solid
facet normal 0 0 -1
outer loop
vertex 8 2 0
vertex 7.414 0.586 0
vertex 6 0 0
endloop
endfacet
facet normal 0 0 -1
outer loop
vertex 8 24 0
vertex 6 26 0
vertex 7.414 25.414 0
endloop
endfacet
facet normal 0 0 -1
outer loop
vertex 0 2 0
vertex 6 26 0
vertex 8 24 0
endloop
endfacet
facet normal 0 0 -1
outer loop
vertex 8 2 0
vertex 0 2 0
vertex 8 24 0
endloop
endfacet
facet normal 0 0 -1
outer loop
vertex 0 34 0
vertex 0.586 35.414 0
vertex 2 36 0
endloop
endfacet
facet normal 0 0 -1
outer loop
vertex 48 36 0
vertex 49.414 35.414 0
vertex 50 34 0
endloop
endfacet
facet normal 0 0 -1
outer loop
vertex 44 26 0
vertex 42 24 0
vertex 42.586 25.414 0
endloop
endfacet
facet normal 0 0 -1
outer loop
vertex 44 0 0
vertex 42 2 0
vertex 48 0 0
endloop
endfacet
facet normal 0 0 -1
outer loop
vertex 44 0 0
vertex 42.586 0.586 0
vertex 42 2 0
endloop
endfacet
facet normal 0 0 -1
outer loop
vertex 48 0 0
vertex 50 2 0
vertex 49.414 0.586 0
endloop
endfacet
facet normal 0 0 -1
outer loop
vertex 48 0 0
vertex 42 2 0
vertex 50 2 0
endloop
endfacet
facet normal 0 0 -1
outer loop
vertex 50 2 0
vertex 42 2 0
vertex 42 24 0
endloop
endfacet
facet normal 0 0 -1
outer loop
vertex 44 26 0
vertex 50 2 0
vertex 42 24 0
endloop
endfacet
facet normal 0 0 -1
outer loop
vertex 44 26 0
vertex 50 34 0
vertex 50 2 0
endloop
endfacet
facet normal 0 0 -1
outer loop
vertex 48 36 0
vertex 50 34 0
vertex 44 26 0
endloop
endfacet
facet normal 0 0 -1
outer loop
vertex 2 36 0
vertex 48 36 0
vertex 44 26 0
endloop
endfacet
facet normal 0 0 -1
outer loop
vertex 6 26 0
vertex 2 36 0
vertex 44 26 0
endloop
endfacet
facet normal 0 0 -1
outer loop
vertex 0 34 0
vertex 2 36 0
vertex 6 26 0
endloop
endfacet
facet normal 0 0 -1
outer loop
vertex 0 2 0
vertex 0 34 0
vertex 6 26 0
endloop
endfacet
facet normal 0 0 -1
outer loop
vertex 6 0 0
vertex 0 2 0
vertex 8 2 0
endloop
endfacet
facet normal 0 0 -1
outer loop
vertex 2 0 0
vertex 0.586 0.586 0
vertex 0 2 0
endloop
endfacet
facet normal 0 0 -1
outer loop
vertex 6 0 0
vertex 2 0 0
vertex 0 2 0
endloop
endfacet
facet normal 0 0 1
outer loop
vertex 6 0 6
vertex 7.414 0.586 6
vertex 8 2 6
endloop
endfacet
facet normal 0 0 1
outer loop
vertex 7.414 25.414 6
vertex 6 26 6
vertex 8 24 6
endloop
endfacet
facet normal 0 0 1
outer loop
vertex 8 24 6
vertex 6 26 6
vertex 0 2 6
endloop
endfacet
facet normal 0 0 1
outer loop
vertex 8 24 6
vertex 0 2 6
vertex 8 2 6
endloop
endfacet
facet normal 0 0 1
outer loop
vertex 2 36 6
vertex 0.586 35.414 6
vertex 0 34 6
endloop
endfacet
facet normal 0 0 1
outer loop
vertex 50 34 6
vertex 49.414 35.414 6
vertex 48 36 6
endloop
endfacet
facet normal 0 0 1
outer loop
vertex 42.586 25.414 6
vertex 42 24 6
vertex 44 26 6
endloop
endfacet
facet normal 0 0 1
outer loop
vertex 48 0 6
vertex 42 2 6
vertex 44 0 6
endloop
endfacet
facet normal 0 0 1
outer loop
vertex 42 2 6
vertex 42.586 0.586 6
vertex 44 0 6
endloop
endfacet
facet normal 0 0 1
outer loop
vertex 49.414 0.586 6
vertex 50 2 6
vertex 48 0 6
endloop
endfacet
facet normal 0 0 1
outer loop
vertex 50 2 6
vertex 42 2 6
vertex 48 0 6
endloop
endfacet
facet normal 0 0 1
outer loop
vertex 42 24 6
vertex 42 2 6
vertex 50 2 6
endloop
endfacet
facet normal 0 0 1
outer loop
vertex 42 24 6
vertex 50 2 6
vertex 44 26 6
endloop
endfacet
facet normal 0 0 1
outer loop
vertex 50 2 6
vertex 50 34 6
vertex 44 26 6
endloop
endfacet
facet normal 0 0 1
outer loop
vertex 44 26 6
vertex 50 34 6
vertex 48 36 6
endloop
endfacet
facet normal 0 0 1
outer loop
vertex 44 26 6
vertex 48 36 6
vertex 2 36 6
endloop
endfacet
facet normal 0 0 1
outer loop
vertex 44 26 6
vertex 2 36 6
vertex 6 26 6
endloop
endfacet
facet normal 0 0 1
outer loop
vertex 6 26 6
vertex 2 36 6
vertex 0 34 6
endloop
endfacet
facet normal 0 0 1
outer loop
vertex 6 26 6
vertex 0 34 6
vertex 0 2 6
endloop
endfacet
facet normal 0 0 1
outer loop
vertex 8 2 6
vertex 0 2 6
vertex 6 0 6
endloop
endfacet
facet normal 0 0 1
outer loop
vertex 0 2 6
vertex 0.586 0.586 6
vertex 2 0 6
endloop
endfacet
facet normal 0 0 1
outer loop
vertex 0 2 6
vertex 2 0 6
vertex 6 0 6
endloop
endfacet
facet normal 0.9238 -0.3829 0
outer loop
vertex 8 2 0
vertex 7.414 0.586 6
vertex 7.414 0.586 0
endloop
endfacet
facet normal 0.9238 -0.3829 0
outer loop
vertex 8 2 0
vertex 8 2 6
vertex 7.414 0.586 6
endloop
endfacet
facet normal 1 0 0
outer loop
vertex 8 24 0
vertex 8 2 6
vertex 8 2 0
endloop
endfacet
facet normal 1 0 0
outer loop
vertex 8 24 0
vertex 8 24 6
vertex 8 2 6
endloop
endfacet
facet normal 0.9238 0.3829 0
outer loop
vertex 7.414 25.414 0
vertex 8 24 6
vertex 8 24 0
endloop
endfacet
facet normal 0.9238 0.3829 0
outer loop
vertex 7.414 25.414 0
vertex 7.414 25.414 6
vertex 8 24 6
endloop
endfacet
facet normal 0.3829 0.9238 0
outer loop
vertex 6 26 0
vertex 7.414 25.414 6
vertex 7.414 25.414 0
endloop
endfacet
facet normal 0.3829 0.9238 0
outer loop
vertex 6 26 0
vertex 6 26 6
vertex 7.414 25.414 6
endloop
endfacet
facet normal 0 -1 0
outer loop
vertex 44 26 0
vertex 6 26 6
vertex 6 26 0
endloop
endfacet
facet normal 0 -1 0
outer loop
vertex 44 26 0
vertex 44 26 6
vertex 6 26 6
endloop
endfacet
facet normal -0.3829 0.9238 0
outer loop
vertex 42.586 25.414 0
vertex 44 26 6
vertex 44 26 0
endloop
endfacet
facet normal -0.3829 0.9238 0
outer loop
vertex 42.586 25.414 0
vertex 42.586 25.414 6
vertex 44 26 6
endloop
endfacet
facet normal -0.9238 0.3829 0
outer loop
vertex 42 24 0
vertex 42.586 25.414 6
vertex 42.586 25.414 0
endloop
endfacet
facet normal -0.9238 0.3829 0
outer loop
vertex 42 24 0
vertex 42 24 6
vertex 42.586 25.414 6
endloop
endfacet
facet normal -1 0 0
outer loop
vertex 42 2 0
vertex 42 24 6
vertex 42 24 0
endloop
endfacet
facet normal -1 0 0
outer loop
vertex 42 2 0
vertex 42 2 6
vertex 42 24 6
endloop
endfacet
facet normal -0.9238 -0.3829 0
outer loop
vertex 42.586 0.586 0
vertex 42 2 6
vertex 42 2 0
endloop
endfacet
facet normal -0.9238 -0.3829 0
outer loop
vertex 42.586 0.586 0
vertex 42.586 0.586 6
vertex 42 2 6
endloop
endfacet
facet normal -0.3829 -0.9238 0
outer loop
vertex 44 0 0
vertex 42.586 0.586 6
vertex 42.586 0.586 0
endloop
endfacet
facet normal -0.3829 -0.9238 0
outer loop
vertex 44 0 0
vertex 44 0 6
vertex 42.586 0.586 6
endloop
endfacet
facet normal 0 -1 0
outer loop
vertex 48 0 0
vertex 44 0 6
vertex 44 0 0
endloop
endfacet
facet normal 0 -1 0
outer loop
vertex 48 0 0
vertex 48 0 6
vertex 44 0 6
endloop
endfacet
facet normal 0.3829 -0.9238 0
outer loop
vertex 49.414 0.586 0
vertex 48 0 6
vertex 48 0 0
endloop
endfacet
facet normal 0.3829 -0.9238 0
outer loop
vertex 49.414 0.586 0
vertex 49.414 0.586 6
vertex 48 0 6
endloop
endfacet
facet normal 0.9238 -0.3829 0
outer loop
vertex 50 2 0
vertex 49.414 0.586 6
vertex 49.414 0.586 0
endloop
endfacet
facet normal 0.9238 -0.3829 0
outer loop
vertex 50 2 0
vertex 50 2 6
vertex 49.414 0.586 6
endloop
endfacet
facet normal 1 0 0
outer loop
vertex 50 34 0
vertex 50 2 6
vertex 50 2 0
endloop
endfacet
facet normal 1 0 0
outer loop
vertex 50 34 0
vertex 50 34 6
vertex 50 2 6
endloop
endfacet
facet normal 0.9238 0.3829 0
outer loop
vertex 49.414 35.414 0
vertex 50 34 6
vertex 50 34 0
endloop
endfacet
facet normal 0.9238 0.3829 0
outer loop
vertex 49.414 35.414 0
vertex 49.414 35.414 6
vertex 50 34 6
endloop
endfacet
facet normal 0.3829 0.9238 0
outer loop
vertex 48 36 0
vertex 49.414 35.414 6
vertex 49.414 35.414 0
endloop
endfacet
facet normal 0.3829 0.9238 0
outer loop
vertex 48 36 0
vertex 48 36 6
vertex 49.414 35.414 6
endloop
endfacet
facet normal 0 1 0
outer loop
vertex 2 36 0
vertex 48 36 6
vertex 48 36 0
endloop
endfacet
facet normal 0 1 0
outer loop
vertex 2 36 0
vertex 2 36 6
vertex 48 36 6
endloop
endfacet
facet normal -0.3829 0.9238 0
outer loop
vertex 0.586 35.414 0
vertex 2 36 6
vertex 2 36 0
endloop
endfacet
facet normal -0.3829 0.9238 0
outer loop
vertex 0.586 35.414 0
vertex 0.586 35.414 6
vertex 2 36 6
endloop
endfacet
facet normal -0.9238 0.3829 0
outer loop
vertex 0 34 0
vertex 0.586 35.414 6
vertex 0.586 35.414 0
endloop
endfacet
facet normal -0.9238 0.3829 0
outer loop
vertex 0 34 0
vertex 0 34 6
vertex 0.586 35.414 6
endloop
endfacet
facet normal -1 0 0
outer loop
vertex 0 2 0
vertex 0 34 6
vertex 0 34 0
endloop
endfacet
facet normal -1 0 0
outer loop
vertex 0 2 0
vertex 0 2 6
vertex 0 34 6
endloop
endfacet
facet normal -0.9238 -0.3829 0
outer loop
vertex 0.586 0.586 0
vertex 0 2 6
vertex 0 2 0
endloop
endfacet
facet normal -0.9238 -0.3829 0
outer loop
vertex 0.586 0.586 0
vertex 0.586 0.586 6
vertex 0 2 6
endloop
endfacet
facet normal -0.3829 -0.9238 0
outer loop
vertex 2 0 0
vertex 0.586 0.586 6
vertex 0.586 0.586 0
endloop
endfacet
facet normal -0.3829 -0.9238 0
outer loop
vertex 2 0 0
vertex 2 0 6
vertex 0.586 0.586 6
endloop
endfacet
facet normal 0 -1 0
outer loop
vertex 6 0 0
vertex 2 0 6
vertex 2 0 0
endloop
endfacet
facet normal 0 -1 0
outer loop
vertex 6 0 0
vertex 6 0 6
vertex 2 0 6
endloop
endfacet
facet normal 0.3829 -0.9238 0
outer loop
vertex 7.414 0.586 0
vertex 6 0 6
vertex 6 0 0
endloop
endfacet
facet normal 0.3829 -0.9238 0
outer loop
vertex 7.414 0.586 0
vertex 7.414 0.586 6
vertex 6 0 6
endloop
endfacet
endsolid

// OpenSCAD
$fn = 32;

// ----------------------------------------------------------------------
// Clip blank: staple clip, 6 mm thick
// ----------------------------------------------------------------------

// --- parameters (mm) ---
profile_height = 6;       // extrusion height
profile_points = 24;      // points of the closed outline

profile = [[0, 2], [0.586, 0.586], [2, 0], [6, 0], [7.414, 0.586], [8, 2], [8, 24], [7.414, 25.414], [6, 26], [44, 26], [42.586, 25.414], [42, 24], [42, 2], [42.586, 0.586], [44, 0], [48, 0], [49.414, 0.586], [50, 2], [50, 34], [49.414, 35.414], [48, 36], [2, 36], [0.586, 35.414], [0, 34]];  // single closed polygon, 24 points, counter clockwise

// --- the one profile operation ---
linear_extrude(height = profile_height) polygon(points = profile);
